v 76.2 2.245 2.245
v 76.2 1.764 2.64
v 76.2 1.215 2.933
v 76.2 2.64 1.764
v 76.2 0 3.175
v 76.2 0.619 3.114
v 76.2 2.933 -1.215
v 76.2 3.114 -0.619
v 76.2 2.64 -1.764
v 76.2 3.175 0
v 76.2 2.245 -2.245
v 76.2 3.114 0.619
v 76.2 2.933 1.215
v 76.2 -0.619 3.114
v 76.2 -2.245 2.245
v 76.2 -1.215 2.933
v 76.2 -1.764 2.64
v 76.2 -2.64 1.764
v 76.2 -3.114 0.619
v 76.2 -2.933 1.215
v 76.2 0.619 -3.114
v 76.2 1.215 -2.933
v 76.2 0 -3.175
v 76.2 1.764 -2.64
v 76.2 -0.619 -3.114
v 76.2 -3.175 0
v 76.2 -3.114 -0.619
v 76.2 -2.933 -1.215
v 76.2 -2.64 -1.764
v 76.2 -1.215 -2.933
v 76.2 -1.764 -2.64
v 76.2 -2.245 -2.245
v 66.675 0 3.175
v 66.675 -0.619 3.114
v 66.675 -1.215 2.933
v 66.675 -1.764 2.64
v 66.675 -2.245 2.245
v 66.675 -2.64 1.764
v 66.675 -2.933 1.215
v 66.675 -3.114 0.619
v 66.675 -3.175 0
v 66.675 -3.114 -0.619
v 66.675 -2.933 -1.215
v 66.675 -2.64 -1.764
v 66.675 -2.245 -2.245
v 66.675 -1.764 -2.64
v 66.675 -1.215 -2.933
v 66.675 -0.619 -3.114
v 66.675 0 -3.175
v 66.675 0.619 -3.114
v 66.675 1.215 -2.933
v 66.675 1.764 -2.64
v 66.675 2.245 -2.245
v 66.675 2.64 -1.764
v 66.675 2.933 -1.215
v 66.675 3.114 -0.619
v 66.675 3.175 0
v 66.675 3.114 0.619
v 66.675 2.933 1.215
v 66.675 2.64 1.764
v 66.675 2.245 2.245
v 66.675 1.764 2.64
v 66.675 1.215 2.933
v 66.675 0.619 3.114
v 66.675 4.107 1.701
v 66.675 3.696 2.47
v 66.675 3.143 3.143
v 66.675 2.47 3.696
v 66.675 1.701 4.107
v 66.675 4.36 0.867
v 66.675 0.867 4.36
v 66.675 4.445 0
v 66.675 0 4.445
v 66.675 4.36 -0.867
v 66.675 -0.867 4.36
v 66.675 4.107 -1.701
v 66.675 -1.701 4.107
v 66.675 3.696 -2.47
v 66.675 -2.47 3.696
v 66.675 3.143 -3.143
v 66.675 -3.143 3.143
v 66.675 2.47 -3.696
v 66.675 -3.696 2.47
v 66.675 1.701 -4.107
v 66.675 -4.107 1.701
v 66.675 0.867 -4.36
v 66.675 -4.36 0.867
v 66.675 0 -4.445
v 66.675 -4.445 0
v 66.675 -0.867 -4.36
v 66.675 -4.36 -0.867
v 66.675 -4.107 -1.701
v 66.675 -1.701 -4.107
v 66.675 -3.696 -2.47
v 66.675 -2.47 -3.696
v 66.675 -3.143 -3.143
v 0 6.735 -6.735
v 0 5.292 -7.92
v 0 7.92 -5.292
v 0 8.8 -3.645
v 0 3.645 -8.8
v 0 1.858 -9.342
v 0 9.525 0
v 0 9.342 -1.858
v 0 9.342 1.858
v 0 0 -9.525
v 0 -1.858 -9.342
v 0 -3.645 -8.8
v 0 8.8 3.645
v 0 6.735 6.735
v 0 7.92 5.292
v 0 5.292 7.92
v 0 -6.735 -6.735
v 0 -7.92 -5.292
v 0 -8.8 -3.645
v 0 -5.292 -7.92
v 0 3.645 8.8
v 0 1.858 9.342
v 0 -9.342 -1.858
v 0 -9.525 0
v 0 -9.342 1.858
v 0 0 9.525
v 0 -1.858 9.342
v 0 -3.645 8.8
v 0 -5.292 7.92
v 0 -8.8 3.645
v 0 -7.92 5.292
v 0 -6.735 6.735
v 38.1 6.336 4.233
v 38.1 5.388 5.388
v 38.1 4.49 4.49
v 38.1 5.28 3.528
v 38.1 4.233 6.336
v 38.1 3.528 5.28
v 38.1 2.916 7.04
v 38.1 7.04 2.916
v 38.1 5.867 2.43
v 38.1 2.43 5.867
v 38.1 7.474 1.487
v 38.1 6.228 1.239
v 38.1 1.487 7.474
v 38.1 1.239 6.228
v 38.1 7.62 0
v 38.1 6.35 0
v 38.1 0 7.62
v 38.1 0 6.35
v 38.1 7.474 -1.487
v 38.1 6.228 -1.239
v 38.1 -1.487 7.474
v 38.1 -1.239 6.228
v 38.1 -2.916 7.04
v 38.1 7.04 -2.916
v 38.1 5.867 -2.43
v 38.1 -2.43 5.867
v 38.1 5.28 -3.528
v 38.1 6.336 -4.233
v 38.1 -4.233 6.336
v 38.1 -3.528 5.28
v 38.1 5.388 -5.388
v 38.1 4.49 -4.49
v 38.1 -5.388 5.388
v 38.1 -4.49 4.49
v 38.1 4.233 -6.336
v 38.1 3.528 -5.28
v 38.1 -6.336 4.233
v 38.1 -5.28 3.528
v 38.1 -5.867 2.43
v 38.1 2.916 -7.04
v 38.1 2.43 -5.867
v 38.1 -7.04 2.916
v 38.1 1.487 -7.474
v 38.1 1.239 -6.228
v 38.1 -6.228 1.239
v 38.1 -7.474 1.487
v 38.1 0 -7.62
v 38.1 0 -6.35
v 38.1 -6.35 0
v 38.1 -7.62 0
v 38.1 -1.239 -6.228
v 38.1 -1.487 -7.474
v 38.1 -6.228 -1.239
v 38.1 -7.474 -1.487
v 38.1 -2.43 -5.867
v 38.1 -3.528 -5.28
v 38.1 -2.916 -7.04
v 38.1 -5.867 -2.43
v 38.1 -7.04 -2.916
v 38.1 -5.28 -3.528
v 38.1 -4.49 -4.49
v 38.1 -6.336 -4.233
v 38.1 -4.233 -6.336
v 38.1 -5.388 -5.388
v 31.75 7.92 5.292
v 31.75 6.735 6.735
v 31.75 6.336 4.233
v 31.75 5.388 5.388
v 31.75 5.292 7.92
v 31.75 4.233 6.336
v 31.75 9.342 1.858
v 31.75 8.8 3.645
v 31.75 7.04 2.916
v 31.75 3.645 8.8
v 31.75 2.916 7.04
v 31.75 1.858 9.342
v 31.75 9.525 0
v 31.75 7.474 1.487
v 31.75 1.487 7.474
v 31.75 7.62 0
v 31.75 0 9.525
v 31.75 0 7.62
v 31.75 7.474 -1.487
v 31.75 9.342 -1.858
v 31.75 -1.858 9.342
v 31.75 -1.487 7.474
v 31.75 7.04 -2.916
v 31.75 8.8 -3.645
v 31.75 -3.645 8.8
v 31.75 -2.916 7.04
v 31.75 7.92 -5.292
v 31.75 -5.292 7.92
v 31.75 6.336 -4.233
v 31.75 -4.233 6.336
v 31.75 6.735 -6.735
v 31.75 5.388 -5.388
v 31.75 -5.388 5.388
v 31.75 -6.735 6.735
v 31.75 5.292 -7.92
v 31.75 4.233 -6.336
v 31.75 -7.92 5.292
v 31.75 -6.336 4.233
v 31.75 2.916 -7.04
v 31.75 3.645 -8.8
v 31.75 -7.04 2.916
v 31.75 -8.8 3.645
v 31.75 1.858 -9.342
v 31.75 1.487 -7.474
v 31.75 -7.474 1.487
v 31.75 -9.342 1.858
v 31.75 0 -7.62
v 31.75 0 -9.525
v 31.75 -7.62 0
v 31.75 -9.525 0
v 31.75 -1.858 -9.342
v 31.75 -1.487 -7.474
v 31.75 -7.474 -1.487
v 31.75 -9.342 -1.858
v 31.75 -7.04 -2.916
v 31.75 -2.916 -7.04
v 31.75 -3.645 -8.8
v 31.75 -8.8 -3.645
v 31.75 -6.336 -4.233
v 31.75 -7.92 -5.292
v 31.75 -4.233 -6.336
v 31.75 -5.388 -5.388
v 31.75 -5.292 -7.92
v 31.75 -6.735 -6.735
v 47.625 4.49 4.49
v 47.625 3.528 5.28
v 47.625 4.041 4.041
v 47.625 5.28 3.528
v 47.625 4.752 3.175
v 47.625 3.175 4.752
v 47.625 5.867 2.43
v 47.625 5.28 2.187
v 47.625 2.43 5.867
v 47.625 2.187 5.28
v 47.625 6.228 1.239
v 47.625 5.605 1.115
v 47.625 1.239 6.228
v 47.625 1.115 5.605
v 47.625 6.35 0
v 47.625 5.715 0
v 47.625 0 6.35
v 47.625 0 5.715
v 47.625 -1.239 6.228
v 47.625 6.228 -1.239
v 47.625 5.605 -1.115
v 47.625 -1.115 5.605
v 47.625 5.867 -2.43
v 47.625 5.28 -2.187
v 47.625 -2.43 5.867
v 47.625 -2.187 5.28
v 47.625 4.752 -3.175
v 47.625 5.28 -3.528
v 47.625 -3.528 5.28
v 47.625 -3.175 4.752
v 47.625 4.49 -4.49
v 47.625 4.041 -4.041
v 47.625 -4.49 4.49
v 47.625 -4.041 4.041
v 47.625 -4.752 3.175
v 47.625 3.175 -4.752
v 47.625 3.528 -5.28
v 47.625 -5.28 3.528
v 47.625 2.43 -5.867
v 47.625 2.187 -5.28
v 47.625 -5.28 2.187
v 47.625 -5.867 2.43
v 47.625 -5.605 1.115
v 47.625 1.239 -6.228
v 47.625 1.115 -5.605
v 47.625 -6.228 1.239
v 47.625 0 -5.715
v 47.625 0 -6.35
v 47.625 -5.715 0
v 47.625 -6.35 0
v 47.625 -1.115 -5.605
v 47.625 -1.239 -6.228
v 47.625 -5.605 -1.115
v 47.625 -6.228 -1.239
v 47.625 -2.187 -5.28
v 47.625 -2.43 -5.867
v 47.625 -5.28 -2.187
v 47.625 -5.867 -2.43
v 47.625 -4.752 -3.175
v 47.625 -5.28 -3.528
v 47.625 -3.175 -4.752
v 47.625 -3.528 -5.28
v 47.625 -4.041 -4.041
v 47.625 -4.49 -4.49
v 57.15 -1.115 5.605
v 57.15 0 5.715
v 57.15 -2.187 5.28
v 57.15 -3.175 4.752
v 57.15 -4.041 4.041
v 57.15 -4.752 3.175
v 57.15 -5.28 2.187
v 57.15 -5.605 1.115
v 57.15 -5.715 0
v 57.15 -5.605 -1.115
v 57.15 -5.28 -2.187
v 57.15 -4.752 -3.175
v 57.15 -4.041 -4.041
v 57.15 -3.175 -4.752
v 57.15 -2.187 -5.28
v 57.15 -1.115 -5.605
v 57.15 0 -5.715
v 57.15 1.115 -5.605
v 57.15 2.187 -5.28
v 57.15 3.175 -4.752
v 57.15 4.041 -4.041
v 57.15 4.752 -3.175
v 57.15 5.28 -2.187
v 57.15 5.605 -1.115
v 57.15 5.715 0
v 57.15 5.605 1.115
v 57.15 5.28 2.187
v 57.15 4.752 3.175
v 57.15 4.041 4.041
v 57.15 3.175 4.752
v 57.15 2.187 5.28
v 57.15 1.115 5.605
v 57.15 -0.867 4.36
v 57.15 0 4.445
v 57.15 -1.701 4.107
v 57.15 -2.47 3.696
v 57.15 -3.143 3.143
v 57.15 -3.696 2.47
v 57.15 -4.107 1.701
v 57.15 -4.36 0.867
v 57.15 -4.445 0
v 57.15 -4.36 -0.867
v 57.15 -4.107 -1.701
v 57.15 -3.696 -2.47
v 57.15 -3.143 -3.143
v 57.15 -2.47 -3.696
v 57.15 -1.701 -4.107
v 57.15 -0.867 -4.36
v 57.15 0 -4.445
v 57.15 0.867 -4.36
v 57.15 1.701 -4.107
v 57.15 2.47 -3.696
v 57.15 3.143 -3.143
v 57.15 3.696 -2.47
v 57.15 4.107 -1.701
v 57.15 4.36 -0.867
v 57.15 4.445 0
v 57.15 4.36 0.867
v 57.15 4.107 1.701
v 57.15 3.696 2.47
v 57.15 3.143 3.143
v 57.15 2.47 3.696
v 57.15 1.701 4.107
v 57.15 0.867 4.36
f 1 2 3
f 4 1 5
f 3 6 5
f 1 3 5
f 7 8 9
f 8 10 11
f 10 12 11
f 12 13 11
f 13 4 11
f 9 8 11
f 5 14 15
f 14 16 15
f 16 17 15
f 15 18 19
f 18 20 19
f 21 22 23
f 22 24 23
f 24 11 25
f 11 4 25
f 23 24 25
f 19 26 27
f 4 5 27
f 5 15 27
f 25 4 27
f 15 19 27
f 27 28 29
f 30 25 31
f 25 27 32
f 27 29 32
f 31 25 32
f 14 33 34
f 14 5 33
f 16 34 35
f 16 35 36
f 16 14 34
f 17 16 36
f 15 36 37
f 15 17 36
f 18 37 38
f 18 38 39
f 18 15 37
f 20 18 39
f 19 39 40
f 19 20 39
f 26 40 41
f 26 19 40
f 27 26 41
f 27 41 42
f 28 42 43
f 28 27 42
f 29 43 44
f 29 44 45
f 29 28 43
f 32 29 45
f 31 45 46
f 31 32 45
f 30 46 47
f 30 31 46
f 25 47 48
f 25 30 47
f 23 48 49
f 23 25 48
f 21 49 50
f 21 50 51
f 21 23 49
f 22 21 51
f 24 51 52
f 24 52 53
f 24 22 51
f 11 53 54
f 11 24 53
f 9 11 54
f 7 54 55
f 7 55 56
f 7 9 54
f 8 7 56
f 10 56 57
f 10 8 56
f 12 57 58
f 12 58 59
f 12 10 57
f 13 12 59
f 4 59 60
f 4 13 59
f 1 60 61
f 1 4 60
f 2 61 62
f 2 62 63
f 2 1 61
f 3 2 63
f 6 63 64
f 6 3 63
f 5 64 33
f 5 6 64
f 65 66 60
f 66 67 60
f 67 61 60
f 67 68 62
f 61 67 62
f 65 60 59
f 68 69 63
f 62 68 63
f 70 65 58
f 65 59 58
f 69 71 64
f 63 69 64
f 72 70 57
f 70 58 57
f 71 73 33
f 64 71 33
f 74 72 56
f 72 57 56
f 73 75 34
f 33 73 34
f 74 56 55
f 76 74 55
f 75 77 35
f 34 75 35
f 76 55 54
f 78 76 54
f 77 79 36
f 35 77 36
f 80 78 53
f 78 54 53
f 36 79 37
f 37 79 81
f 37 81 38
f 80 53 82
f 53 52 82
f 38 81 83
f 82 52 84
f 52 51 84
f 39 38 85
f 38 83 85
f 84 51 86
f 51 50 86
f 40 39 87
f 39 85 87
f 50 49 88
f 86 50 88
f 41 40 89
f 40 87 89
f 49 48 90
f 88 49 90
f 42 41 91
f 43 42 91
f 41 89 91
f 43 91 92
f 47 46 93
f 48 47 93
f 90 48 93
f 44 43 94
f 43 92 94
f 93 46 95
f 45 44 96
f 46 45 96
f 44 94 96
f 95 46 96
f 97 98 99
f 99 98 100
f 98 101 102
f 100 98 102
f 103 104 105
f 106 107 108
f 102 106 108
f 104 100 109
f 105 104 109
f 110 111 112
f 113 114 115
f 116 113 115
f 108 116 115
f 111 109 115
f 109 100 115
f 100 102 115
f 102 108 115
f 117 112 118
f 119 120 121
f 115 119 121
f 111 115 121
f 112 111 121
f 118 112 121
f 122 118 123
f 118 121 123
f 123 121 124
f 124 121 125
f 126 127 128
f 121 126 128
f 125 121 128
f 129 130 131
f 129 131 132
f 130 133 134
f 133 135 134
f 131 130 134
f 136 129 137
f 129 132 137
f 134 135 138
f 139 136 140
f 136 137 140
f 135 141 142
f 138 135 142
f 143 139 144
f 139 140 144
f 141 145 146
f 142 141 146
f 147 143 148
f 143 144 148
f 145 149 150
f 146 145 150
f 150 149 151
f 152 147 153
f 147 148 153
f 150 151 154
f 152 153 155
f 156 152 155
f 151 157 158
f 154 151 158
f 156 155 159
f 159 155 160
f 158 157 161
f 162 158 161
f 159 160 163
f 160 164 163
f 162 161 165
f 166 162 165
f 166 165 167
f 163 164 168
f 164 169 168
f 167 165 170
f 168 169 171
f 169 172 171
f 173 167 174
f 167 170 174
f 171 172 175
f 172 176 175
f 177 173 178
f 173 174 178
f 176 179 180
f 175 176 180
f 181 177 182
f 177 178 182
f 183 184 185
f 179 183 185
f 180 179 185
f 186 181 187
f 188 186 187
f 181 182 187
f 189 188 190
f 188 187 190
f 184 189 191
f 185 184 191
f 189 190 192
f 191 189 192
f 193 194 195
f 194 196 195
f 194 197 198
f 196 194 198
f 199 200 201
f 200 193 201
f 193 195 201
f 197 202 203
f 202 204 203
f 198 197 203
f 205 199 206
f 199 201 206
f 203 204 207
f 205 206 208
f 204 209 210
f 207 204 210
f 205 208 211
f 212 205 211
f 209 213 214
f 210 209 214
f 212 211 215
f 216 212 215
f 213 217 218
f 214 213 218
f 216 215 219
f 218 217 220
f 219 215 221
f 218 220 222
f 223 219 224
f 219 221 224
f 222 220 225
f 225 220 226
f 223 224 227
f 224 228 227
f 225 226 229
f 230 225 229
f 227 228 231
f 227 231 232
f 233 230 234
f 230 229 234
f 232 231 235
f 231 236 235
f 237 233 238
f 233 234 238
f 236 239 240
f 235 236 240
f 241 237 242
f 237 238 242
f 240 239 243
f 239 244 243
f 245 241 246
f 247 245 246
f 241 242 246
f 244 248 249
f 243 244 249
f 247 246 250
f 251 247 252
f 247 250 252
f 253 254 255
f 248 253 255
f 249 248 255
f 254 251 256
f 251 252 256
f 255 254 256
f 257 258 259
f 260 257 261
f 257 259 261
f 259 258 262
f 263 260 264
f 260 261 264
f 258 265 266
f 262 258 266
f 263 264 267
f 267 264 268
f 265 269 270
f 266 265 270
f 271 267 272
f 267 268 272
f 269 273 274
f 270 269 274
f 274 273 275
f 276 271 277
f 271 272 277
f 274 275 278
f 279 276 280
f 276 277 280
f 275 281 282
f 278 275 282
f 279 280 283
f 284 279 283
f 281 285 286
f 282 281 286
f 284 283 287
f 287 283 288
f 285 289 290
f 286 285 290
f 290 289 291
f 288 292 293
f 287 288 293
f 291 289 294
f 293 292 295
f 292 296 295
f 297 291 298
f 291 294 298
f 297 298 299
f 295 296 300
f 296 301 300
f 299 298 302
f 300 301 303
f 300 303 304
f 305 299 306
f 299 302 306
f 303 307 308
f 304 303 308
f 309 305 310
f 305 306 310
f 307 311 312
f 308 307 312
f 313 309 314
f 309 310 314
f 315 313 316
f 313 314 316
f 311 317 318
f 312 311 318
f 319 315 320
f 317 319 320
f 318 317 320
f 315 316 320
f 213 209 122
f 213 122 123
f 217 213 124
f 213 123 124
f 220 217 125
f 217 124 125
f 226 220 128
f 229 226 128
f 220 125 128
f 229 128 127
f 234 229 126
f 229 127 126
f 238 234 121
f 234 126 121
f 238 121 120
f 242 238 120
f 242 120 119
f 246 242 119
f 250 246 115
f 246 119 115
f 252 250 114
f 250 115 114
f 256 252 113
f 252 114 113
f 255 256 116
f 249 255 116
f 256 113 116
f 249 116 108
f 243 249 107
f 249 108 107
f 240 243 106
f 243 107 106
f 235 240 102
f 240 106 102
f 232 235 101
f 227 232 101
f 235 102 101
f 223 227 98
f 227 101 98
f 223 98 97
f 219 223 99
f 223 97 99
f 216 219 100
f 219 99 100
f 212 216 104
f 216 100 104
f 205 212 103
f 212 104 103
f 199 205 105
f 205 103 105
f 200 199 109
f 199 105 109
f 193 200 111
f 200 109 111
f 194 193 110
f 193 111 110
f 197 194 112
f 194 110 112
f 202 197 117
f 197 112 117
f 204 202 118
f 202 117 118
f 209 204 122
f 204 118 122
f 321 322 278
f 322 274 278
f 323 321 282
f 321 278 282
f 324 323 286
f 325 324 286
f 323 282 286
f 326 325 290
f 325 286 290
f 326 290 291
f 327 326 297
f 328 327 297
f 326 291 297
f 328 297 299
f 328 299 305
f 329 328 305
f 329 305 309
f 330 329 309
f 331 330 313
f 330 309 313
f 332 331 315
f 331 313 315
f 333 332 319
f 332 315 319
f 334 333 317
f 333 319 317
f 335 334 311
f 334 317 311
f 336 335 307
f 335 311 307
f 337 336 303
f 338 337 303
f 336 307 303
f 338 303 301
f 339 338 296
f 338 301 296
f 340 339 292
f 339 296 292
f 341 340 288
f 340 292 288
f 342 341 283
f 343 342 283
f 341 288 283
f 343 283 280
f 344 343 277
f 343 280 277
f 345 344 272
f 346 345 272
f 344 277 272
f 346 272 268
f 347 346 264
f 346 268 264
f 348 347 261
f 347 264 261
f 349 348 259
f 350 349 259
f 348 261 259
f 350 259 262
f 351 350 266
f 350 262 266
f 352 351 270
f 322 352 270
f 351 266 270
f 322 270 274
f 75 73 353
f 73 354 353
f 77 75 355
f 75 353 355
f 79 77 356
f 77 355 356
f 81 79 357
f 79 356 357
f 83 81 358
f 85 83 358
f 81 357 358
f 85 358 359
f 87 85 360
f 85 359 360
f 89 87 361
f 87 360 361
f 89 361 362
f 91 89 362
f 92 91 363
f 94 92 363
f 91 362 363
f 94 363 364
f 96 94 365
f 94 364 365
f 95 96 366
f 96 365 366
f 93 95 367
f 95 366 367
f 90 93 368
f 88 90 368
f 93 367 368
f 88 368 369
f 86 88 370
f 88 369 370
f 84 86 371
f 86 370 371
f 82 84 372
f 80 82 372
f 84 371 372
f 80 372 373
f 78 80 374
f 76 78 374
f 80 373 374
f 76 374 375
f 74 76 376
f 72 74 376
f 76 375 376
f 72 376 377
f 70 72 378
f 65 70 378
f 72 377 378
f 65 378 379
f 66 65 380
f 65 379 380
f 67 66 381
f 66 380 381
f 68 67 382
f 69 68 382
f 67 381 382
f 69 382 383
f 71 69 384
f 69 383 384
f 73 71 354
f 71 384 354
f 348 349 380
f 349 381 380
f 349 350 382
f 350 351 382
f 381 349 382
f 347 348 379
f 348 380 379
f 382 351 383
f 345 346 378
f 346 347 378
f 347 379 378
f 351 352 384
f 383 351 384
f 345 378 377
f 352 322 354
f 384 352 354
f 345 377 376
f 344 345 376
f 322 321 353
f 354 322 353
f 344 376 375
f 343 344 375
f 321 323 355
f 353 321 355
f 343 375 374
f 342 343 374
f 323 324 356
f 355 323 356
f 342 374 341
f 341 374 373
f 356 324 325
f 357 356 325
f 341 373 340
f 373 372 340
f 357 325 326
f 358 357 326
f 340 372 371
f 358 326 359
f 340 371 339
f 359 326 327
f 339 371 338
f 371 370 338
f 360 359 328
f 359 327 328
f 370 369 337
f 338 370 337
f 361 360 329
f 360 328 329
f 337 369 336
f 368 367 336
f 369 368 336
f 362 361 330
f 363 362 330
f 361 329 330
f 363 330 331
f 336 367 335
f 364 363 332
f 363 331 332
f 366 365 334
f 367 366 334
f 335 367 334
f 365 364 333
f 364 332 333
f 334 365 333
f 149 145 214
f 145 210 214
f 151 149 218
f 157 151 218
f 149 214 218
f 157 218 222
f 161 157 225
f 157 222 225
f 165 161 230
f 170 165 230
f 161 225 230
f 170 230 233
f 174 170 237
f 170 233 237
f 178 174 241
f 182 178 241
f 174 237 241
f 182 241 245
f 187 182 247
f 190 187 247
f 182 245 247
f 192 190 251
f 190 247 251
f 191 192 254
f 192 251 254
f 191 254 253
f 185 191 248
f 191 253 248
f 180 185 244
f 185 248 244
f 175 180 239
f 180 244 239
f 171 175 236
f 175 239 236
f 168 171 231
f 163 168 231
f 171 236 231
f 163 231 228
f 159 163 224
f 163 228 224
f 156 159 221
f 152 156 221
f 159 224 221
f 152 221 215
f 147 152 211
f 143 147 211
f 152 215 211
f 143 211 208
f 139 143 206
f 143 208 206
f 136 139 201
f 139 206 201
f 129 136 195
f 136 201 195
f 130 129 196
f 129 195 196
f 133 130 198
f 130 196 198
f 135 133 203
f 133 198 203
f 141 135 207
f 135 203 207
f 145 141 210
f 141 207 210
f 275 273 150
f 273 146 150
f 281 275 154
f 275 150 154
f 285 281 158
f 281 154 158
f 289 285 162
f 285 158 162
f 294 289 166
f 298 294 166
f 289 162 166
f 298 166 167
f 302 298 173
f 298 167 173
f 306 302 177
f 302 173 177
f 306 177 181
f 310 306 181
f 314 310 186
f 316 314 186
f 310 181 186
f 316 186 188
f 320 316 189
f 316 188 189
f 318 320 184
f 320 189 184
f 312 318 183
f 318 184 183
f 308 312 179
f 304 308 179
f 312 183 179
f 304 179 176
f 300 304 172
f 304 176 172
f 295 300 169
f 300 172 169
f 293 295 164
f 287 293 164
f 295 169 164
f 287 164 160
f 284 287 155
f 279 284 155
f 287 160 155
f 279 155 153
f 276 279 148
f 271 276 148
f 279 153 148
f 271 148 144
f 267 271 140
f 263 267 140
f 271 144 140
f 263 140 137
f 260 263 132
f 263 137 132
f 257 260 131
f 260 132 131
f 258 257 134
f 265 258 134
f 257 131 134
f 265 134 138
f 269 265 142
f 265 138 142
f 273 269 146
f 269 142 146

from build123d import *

# Parameters (mm, degrees)
SKETCH1_W = 9.525
SKETCH1_H = 3.175


with BuildPart() as part:
    # Sketch1 → Revolve2 (revolve)
    with BuildSketch(Plane.XY, mode=Mode.PRIVATE) as revolve2_sk:
        Polygon((0, 9.525), (0, 0), (31.75, 0), (31.75, 7.62), (31.75, 9.525), align=None)
        Polygon((31.75, 7.62), (31.75, 0), (38.1, 0), (38.1, 6.35), (38.1, 7.62), align=None)
        Polygon((38.1, 6.35), (38.1, 0), (47.625, 0), (47.625, 5.715), (47.625, 6.35), align=None)
        Polygon((47.625, 5.715), (47.625, 0), (57.15, 0), (57.15, 4.445), (57.15, 5.715), align=None)
        Polygon((57.15, 4.445), (57.15, 0), (66.675, 0), (66.675, 3.175), (66.675, 4.445), align=None)
        with Locations((71.4375, 1.5875)):
            Rectangle(SKETCH1_W, SKETCH1_H)
    revolve(revolve2_sk.sketch.rotate(Axis((0, 0, 0), (1, 0, 0)), 90), axis=Axis((0, 0, 0), (1, 0, 0)))


solid = part.part
